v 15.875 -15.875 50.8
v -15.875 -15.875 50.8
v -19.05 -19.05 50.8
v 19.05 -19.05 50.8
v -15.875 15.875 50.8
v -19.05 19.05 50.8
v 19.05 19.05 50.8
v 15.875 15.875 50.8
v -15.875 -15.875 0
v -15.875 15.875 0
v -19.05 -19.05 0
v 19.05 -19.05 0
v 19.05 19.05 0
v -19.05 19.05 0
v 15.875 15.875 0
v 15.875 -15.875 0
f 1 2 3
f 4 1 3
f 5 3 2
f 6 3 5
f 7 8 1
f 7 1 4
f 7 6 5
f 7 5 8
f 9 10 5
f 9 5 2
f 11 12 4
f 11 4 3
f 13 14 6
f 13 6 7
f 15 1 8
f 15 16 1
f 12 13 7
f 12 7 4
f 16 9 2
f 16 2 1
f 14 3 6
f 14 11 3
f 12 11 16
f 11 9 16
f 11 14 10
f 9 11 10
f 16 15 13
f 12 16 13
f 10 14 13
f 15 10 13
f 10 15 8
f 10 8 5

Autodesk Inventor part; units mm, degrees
ref_plane "YZ Plane" through (0, 0, 0) normal (1, 0, 0) x (0, 1, 0)
ref_plane "Start Plane" through (0, 0, 0) normal (0, 0, 1) x (1, 0, 0)
ref_plane "End Plane" through (0, 0, 50.8) normal (0, 0, 1) x (1, 0, 0)
sketch "Sketch1" plane through (0, 0, 0) normal (0, 0, 1) x (1, 0, 0)
  line L0 (-19.05, 19.05) -> (19.05, 19.05)
  line L1 (19.05, 19.05) -> (19.05, -19.05)
  line L2 (19.05, -19.05) -> (-19.05, -19.05)
  line L3 (-19.05, -19.05) -> (-19.05, 19.05)
  line L4 (15.875, 15.875) -> (-15.875, 15.875)
  line L5 (-15.875, 15.875) -> (-15.875, -15.875)
  line L6 (-15.875, -15.875) -> (15.875, -15.875)
  line L7 (15.875, -15.875) -> (15.875, 15.875)
  point P0 (0, 0)
  point P1 (0, 19.05)
  point P2 (-19.05, 0)
  dimension "width" = 38.1
  dimension "d1" = 3.175
extrude "Body" add sketch "Sketch1" along normal up to surface (50.8 mm away) from surface at 0
sketch "Sketch4" plane through (0, 0, 0) normal (0, 0, 1) x (1, 0, 0)
  line L0 (0, 0) -> (10, 0)
ref_plane "Work Plane4" through (0, 0, 0) normal (0, -1, 0) x (1, 0, 0)
sketch "Sketch5" plane through (0, 0, 0) normal (0, -1, 0) x (1, 0, 0)
  line L0 (-26.67, 0) -> (26.67, 0)
  line L1 (-26.67, 50.8) -> (26.67, 50.8)
  dimension "d9" = 50.8
equation "\"G_OFFSET_START\" = 0"
equation "\"G_OFFSET_END\" = 0"
equation "\"d5\" = length + G_OFFSET_END"
equation "\"G_L\" = d9"
equation "\"length\" = 50.8"
properties part number "1.5x1.5x.125 Tube"
